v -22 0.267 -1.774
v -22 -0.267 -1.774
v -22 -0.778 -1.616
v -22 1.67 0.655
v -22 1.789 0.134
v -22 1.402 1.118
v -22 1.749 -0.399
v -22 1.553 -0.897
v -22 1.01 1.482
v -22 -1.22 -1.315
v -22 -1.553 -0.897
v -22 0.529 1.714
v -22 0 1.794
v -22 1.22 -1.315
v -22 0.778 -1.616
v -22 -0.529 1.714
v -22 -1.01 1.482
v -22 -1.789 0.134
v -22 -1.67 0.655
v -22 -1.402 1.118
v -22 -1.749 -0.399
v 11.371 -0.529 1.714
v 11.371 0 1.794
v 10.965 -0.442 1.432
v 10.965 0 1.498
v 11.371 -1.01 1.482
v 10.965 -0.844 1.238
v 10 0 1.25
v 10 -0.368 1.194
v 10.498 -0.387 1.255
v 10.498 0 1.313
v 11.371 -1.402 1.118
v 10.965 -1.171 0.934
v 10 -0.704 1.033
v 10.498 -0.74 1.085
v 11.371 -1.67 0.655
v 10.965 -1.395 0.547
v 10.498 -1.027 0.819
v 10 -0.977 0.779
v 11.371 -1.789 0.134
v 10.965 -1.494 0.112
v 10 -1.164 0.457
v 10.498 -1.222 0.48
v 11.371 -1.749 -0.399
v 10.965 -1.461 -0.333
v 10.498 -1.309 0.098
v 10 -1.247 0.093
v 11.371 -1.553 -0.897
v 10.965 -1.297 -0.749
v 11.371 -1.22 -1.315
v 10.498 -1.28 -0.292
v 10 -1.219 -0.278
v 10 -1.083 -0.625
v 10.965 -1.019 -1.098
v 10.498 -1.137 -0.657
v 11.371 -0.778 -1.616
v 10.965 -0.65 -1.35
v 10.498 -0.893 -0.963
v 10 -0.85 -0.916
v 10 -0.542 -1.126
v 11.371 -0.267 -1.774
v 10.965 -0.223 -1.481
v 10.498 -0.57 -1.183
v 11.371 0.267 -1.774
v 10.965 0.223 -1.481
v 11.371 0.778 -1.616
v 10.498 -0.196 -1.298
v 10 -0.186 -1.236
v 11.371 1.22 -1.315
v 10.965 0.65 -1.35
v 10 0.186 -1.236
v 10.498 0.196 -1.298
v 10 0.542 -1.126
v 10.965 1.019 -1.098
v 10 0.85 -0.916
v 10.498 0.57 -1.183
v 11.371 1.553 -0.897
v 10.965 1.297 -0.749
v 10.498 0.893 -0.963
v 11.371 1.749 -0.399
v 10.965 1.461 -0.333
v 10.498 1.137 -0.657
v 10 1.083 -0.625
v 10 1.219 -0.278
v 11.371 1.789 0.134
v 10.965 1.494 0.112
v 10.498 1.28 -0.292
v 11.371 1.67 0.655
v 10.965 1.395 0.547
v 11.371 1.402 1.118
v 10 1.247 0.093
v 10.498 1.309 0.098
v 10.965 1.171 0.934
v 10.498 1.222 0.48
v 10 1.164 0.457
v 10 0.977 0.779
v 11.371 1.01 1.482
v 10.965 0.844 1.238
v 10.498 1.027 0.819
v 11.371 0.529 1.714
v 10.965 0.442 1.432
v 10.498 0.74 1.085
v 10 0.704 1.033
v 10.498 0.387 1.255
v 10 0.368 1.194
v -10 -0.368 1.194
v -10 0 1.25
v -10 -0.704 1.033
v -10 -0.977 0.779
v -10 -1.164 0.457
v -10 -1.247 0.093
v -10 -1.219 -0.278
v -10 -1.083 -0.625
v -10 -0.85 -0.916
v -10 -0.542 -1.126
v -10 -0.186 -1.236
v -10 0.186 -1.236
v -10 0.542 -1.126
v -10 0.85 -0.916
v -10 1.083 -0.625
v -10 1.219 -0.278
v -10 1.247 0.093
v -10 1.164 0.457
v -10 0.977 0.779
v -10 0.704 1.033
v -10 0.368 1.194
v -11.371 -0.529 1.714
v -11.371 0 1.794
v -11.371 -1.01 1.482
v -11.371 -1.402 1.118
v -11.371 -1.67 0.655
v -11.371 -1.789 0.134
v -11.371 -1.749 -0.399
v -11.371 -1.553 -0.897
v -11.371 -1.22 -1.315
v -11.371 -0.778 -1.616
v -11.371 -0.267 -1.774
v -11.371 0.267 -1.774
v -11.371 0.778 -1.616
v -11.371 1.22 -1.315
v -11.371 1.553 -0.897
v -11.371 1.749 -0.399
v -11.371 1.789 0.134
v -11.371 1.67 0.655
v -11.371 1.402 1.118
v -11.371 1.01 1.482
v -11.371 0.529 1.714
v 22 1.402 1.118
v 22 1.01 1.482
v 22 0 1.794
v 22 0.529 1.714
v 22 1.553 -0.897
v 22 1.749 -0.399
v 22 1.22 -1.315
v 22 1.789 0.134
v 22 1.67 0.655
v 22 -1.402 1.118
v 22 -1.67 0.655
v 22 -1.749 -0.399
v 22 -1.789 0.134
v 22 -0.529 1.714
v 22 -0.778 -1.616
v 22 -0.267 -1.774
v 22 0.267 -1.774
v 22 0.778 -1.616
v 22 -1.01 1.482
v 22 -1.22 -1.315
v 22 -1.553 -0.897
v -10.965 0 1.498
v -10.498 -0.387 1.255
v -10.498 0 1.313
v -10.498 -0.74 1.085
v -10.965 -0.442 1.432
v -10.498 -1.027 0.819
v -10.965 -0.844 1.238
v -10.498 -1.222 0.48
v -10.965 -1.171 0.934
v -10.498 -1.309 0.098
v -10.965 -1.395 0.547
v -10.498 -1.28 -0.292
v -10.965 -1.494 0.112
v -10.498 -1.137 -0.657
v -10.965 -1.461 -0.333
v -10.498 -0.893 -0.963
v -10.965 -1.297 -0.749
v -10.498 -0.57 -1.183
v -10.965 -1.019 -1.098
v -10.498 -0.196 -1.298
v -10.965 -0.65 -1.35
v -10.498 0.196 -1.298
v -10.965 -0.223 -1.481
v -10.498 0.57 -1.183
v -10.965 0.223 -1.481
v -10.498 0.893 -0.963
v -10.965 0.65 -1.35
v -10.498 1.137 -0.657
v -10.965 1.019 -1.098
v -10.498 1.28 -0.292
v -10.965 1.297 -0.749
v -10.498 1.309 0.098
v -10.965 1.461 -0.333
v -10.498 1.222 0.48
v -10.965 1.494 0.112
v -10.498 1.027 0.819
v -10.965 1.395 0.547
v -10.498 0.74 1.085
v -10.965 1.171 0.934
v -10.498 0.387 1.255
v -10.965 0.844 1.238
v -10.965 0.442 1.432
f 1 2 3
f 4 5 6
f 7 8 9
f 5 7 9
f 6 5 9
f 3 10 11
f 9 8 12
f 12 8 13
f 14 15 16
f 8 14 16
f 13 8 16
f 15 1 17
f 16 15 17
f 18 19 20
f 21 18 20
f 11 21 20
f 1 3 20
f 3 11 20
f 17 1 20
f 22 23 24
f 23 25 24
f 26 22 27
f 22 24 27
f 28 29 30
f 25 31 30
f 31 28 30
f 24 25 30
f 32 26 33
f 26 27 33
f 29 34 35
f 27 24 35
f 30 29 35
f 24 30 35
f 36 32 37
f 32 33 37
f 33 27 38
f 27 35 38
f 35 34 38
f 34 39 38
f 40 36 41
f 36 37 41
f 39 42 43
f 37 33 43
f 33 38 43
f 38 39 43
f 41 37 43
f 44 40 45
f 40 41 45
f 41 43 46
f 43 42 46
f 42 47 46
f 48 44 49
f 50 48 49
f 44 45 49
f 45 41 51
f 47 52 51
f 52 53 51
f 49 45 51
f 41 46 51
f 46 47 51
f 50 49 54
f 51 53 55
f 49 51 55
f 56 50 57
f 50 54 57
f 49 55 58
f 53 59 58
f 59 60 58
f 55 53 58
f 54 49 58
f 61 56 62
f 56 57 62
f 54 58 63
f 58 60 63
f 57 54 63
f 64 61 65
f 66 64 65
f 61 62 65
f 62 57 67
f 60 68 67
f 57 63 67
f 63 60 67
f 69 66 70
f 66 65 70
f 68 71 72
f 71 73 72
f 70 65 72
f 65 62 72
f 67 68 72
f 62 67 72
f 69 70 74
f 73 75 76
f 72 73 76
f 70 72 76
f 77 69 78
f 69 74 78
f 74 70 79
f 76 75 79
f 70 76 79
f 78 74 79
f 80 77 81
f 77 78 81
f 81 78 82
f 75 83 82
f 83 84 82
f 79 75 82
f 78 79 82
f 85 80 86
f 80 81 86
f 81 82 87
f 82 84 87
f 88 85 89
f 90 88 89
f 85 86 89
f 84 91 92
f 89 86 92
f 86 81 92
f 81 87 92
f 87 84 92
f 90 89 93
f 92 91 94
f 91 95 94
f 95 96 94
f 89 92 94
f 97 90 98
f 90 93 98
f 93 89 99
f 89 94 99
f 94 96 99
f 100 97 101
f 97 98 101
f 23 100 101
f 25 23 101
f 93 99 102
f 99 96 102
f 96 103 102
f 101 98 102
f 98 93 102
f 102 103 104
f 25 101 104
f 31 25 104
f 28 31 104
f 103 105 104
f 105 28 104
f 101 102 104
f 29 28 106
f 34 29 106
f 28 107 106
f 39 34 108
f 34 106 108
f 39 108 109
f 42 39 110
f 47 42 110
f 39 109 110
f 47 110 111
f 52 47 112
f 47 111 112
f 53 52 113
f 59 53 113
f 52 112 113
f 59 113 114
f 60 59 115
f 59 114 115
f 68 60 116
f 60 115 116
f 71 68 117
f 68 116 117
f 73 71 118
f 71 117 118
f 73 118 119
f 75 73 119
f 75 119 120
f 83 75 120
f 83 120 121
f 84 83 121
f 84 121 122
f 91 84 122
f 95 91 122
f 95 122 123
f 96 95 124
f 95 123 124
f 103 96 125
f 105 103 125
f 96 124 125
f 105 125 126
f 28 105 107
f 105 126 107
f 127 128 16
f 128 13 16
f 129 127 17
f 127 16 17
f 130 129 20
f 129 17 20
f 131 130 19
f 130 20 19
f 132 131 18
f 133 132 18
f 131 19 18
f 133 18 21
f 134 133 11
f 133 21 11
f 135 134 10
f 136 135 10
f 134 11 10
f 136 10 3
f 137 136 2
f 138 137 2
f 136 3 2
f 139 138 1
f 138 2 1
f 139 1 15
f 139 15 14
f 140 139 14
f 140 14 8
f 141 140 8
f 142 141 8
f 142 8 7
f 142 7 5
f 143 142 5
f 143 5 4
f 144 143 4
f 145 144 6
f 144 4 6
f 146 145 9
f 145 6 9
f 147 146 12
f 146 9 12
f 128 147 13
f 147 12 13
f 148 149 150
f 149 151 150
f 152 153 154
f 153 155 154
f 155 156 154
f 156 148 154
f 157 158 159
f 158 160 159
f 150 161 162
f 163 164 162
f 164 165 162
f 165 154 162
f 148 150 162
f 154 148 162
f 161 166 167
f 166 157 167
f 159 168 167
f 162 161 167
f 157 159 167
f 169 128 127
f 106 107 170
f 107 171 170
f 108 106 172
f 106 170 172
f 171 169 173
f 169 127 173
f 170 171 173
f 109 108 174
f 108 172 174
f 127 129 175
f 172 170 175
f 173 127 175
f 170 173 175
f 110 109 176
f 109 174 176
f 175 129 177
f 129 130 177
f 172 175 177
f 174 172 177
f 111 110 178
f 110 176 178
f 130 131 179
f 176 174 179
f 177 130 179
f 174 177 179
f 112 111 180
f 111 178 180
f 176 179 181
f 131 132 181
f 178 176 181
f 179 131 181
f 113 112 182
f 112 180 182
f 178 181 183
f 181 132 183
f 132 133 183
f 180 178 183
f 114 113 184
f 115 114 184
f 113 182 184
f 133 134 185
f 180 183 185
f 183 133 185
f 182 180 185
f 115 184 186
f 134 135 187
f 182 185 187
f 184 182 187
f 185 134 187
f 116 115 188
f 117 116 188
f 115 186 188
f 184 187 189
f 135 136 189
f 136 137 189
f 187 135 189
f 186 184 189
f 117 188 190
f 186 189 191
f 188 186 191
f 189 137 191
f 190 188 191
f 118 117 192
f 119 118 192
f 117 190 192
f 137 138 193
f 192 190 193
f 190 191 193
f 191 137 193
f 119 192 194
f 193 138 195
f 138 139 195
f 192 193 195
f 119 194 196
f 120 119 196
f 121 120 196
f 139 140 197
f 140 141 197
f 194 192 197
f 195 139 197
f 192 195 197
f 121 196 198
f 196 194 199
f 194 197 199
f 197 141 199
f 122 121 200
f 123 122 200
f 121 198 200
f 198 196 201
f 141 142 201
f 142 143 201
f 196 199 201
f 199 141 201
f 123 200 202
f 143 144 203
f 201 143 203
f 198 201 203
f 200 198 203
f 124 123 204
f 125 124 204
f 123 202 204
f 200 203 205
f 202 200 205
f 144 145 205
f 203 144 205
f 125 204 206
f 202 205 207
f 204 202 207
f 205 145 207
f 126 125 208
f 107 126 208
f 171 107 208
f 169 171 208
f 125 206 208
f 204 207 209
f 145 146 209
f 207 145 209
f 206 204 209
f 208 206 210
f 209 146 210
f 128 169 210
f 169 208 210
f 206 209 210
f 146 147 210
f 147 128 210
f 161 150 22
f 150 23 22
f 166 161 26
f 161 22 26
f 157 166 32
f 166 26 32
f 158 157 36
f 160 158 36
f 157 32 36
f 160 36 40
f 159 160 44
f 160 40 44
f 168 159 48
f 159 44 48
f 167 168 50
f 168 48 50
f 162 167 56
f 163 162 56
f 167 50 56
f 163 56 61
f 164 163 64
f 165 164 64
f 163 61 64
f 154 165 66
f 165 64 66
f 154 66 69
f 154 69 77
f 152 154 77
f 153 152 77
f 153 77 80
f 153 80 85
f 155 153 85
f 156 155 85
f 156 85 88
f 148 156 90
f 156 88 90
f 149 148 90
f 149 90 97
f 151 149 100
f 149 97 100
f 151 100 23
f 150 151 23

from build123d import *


with BuildPart() as f1:
    # F0 (on Front) → F1 (revolve)
    with BuildSketch(Plane.XZ):
        with BuildLine():
            Line((10, 1.25), (0, 1.25))
            Line((0, 1.25), (-10, 1.25))
            ThreePointArc((-10, 1.25), (-10.737251, 1.390844), (-11.370665, 1.793539))
            Line((-11.370665, 1.793539), (-21.999996, 1.793539))
            Line((-21.999996, 1.793539), (-21.999996, 0))
            Line((-21.999996, 0), (0, 0))
            Line((0, 0), (21.999996, 0))
            Line((21.999996, 0), (21.999996, 1.793539))
            Line((21.999996, 1.793539), (11.370665, 1.793539))
            ThreePointArc((11.370665, 1.793539), (10.737251, 1.390844), (10, 1.25))
        make_face()
    revolve(axis=Axis((-10.999998, 0, 0), (1, 0, 0)))


solid = f1.part
